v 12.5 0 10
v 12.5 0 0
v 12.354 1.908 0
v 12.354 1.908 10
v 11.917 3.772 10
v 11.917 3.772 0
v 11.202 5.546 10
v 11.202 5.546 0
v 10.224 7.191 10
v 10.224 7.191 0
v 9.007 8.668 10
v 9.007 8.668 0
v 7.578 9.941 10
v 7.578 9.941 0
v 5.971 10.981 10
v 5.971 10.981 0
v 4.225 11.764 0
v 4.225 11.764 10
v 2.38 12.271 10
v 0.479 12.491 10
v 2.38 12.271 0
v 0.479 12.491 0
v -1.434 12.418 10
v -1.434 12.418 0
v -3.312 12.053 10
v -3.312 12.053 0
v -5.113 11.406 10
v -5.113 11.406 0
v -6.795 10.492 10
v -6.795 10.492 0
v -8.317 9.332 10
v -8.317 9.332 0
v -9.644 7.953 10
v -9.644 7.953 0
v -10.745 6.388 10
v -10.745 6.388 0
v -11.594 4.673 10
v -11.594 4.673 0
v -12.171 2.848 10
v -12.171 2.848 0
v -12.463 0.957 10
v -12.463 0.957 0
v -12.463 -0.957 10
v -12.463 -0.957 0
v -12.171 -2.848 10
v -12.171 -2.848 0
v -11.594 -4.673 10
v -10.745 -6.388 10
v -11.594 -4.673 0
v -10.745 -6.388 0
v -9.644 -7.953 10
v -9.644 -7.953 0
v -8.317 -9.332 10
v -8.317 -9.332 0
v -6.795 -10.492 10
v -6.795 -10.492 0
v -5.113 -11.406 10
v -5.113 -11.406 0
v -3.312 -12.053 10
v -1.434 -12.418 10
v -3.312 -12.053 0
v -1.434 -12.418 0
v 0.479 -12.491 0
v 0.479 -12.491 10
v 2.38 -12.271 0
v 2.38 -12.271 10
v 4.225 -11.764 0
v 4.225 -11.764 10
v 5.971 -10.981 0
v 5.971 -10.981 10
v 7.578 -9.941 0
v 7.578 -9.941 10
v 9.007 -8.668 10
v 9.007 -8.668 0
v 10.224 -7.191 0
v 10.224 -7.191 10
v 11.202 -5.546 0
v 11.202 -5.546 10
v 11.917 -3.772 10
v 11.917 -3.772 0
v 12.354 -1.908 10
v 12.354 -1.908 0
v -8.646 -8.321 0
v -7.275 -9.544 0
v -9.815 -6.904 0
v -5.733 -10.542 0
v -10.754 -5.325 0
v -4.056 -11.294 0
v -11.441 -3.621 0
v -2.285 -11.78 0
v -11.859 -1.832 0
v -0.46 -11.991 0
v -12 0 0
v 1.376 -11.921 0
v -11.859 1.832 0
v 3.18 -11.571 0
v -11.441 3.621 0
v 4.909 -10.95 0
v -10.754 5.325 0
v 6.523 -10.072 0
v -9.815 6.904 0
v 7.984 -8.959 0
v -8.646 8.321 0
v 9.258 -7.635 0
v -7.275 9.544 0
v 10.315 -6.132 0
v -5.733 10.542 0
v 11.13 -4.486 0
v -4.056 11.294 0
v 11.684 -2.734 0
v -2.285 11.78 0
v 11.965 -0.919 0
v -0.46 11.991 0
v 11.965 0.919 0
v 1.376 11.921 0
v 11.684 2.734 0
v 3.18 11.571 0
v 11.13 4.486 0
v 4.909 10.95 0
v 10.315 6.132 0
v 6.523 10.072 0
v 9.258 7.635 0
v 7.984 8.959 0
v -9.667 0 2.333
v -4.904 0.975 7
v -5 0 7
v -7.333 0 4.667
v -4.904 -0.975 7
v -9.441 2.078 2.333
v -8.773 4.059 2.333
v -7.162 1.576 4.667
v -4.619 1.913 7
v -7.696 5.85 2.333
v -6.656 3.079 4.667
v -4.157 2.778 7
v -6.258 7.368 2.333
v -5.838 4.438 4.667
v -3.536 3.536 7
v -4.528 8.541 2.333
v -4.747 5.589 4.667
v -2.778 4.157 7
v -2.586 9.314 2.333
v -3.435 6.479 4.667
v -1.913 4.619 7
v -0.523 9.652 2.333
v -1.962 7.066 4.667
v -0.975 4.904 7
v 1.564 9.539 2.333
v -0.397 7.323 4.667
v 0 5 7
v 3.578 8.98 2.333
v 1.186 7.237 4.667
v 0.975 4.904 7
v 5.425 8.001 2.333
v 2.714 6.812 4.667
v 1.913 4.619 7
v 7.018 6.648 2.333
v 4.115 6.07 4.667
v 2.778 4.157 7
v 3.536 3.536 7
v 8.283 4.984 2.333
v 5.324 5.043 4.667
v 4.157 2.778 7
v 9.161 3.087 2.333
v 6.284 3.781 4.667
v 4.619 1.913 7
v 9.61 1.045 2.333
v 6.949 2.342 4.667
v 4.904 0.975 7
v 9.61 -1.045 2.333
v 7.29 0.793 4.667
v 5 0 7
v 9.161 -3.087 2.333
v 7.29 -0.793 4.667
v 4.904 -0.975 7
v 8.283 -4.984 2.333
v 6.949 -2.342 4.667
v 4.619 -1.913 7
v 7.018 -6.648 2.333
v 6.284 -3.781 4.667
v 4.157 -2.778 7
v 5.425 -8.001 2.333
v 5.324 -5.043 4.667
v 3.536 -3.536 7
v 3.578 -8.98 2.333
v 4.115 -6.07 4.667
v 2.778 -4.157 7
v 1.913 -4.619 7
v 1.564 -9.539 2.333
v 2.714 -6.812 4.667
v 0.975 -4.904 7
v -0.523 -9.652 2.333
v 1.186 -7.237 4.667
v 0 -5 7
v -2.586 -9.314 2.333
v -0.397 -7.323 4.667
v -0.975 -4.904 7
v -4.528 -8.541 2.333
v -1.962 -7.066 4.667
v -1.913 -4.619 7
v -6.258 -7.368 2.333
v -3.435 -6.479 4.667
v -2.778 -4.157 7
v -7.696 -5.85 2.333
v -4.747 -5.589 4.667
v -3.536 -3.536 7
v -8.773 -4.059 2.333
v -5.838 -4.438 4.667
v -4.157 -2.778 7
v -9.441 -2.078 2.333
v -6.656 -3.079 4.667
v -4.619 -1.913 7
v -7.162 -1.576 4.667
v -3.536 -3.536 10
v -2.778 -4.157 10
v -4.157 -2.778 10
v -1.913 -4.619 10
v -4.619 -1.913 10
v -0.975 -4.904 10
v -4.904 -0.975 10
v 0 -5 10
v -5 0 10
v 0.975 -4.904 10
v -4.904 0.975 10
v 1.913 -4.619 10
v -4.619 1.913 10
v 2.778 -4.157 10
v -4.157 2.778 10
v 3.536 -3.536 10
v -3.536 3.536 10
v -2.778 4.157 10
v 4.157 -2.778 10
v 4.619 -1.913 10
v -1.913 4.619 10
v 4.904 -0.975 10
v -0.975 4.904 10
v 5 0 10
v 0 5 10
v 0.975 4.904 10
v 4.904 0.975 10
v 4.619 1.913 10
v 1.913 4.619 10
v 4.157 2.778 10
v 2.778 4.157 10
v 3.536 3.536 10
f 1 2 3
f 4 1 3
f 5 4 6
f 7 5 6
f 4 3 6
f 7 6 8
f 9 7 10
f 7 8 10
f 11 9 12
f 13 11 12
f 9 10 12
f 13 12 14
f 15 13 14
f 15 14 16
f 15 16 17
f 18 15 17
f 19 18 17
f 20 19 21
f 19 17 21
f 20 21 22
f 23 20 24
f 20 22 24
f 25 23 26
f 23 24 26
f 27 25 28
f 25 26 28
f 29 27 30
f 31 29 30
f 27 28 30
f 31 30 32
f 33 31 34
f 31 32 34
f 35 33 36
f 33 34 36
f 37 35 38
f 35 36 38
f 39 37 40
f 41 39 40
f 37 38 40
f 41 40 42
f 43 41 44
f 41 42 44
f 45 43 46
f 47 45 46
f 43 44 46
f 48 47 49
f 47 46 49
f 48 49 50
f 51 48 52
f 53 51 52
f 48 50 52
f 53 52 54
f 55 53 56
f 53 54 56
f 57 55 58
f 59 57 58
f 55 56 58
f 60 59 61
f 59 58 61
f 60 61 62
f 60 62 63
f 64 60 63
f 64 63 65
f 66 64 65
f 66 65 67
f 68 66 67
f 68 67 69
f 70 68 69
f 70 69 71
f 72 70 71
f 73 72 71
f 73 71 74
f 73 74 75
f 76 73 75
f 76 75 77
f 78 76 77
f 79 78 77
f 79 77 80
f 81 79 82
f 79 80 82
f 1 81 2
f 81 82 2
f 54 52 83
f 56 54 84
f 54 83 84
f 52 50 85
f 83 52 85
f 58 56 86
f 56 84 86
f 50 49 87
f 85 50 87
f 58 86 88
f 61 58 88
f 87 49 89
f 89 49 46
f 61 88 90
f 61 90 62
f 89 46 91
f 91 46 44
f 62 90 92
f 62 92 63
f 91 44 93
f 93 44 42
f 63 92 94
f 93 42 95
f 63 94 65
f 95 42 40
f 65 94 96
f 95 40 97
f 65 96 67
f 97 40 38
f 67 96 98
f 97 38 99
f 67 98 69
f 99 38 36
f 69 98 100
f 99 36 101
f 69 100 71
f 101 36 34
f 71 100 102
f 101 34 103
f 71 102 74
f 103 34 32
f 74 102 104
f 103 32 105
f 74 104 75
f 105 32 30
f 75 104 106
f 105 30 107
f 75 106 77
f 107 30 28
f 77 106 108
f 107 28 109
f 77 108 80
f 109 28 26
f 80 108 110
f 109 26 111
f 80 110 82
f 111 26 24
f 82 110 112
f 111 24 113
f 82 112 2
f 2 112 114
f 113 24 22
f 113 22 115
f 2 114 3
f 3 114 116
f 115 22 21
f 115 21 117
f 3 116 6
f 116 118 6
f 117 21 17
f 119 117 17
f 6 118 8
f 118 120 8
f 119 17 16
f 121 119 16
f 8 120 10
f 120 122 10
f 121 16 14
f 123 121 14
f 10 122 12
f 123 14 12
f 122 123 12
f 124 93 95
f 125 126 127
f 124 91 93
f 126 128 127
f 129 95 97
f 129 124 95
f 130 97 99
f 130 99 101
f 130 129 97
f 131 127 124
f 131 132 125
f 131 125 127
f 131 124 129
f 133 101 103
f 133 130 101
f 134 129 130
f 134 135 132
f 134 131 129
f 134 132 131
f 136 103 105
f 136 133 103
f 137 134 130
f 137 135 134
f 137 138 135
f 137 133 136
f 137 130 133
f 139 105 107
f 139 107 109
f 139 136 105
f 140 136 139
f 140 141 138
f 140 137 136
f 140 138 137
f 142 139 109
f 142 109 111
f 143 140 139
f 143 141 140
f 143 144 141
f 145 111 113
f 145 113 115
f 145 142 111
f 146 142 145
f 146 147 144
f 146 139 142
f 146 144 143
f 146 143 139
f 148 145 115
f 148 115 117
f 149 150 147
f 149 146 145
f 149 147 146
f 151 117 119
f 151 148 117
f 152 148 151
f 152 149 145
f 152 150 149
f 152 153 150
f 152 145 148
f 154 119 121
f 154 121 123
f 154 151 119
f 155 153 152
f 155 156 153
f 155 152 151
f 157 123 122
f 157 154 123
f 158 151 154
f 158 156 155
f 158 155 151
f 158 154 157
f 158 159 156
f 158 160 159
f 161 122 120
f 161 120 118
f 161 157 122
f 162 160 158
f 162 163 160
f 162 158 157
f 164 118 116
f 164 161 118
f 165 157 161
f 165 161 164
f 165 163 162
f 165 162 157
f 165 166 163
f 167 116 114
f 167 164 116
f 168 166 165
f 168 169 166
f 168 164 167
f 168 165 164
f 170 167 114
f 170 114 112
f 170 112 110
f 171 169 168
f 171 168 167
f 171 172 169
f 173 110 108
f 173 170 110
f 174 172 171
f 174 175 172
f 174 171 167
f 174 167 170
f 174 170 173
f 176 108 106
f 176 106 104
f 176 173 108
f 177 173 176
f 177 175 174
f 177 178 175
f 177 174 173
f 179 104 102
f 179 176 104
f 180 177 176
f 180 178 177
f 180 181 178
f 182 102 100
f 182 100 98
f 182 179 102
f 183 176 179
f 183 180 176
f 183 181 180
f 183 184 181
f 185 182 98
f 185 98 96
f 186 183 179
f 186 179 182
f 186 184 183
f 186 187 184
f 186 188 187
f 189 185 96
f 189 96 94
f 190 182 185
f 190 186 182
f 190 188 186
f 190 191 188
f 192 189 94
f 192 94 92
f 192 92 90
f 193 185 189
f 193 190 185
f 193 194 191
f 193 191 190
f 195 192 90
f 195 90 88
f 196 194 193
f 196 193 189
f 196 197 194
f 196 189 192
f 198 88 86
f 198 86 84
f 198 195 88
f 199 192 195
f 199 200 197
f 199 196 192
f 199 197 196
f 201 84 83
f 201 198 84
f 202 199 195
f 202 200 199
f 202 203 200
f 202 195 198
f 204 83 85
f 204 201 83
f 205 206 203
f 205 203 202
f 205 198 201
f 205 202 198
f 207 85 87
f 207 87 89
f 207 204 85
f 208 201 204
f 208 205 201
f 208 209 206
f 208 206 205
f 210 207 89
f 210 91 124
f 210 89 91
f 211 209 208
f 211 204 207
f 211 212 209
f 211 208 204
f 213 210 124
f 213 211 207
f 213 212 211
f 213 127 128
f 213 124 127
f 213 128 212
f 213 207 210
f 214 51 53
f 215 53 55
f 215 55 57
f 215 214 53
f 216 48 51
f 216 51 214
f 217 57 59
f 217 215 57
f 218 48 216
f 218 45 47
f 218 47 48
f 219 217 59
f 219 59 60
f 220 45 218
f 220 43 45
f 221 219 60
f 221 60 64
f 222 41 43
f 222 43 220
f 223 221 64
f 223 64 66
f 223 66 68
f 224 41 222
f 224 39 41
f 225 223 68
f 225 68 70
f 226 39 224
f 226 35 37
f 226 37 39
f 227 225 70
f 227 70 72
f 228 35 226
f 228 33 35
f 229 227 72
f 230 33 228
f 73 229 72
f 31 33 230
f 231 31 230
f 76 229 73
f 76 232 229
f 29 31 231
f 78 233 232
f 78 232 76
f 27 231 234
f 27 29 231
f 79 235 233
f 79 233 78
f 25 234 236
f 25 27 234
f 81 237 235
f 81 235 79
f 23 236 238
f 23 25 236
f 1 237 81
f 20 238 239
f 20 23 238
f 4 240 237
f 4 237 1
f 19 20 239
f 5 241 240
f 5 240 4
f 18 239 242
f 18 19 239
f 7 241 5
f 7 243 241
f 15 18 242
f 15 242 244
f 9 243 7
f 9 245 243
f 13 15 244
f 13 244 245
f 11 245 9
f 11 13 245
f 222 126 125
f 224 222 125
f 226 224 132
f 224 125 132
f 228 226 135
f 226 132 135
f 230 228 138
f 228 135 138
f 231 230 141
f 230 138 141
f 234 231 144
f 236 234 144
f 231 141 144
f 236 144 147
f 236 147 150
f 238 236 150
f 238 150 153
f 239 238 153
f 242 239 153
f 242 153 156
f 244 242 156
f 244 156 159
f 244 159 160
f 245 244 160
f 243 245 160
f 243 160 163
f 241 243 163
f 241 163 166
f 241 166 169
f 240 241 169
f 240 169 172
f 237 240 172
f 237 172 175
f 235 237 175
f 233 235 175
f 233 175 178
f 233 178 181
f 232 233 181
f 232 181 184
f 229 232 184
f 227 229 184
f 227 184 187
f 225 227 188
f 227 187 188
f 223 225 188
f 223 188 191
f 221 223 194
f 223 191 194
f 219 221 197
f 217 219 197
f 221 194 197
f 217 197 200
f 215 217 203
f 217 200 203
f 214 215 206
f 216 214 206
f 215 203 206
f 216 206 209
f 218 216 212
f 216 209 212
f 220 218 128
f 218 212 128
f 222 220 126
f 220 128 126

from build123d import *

# Parameters (mm, degrees)
SKETCH_1_R          = 12.5
EXTRUDE_1_DEPTH     = 10
SKETCH_3_R          = 5
CUT_EXTRUDE_1_DEPTH = 11
CHAMFER_1_SIZE      = 7


with BuildPart() as part:
    # ｽｹｯﾁ1 → ﾎﾞｽ - 押し出し1 (new body)
    with BuildSketch(Plane.XY):
        Circle(SKETCH_1_R)
    extrude(amount=EXTRUDE_1_DEPTH)

    # ｽｹｯﾁ3 → ｶｯﾄ - 押し出し1 (cut, through all)
    with BuildSketch(Plane(origin=(0, 0, 0), x_dir=(-1, 0, 0), z_dir=(0, 0, -1))):
        Circle(SKETCH_3_R)
    extrude(amount=-CUT_EXTRUDE_1_DEPTH, mode=Mode.SUBTRACT)

    # 面取り1
    chamfer_1_edges = [part.edges().sort_by_distance(p)[0] for p in [
        (5, 0, 0),
    ]]
    chamfer(chamfer_1_edges, length=CHAMFER_1_SIZE)


solid = part.part
